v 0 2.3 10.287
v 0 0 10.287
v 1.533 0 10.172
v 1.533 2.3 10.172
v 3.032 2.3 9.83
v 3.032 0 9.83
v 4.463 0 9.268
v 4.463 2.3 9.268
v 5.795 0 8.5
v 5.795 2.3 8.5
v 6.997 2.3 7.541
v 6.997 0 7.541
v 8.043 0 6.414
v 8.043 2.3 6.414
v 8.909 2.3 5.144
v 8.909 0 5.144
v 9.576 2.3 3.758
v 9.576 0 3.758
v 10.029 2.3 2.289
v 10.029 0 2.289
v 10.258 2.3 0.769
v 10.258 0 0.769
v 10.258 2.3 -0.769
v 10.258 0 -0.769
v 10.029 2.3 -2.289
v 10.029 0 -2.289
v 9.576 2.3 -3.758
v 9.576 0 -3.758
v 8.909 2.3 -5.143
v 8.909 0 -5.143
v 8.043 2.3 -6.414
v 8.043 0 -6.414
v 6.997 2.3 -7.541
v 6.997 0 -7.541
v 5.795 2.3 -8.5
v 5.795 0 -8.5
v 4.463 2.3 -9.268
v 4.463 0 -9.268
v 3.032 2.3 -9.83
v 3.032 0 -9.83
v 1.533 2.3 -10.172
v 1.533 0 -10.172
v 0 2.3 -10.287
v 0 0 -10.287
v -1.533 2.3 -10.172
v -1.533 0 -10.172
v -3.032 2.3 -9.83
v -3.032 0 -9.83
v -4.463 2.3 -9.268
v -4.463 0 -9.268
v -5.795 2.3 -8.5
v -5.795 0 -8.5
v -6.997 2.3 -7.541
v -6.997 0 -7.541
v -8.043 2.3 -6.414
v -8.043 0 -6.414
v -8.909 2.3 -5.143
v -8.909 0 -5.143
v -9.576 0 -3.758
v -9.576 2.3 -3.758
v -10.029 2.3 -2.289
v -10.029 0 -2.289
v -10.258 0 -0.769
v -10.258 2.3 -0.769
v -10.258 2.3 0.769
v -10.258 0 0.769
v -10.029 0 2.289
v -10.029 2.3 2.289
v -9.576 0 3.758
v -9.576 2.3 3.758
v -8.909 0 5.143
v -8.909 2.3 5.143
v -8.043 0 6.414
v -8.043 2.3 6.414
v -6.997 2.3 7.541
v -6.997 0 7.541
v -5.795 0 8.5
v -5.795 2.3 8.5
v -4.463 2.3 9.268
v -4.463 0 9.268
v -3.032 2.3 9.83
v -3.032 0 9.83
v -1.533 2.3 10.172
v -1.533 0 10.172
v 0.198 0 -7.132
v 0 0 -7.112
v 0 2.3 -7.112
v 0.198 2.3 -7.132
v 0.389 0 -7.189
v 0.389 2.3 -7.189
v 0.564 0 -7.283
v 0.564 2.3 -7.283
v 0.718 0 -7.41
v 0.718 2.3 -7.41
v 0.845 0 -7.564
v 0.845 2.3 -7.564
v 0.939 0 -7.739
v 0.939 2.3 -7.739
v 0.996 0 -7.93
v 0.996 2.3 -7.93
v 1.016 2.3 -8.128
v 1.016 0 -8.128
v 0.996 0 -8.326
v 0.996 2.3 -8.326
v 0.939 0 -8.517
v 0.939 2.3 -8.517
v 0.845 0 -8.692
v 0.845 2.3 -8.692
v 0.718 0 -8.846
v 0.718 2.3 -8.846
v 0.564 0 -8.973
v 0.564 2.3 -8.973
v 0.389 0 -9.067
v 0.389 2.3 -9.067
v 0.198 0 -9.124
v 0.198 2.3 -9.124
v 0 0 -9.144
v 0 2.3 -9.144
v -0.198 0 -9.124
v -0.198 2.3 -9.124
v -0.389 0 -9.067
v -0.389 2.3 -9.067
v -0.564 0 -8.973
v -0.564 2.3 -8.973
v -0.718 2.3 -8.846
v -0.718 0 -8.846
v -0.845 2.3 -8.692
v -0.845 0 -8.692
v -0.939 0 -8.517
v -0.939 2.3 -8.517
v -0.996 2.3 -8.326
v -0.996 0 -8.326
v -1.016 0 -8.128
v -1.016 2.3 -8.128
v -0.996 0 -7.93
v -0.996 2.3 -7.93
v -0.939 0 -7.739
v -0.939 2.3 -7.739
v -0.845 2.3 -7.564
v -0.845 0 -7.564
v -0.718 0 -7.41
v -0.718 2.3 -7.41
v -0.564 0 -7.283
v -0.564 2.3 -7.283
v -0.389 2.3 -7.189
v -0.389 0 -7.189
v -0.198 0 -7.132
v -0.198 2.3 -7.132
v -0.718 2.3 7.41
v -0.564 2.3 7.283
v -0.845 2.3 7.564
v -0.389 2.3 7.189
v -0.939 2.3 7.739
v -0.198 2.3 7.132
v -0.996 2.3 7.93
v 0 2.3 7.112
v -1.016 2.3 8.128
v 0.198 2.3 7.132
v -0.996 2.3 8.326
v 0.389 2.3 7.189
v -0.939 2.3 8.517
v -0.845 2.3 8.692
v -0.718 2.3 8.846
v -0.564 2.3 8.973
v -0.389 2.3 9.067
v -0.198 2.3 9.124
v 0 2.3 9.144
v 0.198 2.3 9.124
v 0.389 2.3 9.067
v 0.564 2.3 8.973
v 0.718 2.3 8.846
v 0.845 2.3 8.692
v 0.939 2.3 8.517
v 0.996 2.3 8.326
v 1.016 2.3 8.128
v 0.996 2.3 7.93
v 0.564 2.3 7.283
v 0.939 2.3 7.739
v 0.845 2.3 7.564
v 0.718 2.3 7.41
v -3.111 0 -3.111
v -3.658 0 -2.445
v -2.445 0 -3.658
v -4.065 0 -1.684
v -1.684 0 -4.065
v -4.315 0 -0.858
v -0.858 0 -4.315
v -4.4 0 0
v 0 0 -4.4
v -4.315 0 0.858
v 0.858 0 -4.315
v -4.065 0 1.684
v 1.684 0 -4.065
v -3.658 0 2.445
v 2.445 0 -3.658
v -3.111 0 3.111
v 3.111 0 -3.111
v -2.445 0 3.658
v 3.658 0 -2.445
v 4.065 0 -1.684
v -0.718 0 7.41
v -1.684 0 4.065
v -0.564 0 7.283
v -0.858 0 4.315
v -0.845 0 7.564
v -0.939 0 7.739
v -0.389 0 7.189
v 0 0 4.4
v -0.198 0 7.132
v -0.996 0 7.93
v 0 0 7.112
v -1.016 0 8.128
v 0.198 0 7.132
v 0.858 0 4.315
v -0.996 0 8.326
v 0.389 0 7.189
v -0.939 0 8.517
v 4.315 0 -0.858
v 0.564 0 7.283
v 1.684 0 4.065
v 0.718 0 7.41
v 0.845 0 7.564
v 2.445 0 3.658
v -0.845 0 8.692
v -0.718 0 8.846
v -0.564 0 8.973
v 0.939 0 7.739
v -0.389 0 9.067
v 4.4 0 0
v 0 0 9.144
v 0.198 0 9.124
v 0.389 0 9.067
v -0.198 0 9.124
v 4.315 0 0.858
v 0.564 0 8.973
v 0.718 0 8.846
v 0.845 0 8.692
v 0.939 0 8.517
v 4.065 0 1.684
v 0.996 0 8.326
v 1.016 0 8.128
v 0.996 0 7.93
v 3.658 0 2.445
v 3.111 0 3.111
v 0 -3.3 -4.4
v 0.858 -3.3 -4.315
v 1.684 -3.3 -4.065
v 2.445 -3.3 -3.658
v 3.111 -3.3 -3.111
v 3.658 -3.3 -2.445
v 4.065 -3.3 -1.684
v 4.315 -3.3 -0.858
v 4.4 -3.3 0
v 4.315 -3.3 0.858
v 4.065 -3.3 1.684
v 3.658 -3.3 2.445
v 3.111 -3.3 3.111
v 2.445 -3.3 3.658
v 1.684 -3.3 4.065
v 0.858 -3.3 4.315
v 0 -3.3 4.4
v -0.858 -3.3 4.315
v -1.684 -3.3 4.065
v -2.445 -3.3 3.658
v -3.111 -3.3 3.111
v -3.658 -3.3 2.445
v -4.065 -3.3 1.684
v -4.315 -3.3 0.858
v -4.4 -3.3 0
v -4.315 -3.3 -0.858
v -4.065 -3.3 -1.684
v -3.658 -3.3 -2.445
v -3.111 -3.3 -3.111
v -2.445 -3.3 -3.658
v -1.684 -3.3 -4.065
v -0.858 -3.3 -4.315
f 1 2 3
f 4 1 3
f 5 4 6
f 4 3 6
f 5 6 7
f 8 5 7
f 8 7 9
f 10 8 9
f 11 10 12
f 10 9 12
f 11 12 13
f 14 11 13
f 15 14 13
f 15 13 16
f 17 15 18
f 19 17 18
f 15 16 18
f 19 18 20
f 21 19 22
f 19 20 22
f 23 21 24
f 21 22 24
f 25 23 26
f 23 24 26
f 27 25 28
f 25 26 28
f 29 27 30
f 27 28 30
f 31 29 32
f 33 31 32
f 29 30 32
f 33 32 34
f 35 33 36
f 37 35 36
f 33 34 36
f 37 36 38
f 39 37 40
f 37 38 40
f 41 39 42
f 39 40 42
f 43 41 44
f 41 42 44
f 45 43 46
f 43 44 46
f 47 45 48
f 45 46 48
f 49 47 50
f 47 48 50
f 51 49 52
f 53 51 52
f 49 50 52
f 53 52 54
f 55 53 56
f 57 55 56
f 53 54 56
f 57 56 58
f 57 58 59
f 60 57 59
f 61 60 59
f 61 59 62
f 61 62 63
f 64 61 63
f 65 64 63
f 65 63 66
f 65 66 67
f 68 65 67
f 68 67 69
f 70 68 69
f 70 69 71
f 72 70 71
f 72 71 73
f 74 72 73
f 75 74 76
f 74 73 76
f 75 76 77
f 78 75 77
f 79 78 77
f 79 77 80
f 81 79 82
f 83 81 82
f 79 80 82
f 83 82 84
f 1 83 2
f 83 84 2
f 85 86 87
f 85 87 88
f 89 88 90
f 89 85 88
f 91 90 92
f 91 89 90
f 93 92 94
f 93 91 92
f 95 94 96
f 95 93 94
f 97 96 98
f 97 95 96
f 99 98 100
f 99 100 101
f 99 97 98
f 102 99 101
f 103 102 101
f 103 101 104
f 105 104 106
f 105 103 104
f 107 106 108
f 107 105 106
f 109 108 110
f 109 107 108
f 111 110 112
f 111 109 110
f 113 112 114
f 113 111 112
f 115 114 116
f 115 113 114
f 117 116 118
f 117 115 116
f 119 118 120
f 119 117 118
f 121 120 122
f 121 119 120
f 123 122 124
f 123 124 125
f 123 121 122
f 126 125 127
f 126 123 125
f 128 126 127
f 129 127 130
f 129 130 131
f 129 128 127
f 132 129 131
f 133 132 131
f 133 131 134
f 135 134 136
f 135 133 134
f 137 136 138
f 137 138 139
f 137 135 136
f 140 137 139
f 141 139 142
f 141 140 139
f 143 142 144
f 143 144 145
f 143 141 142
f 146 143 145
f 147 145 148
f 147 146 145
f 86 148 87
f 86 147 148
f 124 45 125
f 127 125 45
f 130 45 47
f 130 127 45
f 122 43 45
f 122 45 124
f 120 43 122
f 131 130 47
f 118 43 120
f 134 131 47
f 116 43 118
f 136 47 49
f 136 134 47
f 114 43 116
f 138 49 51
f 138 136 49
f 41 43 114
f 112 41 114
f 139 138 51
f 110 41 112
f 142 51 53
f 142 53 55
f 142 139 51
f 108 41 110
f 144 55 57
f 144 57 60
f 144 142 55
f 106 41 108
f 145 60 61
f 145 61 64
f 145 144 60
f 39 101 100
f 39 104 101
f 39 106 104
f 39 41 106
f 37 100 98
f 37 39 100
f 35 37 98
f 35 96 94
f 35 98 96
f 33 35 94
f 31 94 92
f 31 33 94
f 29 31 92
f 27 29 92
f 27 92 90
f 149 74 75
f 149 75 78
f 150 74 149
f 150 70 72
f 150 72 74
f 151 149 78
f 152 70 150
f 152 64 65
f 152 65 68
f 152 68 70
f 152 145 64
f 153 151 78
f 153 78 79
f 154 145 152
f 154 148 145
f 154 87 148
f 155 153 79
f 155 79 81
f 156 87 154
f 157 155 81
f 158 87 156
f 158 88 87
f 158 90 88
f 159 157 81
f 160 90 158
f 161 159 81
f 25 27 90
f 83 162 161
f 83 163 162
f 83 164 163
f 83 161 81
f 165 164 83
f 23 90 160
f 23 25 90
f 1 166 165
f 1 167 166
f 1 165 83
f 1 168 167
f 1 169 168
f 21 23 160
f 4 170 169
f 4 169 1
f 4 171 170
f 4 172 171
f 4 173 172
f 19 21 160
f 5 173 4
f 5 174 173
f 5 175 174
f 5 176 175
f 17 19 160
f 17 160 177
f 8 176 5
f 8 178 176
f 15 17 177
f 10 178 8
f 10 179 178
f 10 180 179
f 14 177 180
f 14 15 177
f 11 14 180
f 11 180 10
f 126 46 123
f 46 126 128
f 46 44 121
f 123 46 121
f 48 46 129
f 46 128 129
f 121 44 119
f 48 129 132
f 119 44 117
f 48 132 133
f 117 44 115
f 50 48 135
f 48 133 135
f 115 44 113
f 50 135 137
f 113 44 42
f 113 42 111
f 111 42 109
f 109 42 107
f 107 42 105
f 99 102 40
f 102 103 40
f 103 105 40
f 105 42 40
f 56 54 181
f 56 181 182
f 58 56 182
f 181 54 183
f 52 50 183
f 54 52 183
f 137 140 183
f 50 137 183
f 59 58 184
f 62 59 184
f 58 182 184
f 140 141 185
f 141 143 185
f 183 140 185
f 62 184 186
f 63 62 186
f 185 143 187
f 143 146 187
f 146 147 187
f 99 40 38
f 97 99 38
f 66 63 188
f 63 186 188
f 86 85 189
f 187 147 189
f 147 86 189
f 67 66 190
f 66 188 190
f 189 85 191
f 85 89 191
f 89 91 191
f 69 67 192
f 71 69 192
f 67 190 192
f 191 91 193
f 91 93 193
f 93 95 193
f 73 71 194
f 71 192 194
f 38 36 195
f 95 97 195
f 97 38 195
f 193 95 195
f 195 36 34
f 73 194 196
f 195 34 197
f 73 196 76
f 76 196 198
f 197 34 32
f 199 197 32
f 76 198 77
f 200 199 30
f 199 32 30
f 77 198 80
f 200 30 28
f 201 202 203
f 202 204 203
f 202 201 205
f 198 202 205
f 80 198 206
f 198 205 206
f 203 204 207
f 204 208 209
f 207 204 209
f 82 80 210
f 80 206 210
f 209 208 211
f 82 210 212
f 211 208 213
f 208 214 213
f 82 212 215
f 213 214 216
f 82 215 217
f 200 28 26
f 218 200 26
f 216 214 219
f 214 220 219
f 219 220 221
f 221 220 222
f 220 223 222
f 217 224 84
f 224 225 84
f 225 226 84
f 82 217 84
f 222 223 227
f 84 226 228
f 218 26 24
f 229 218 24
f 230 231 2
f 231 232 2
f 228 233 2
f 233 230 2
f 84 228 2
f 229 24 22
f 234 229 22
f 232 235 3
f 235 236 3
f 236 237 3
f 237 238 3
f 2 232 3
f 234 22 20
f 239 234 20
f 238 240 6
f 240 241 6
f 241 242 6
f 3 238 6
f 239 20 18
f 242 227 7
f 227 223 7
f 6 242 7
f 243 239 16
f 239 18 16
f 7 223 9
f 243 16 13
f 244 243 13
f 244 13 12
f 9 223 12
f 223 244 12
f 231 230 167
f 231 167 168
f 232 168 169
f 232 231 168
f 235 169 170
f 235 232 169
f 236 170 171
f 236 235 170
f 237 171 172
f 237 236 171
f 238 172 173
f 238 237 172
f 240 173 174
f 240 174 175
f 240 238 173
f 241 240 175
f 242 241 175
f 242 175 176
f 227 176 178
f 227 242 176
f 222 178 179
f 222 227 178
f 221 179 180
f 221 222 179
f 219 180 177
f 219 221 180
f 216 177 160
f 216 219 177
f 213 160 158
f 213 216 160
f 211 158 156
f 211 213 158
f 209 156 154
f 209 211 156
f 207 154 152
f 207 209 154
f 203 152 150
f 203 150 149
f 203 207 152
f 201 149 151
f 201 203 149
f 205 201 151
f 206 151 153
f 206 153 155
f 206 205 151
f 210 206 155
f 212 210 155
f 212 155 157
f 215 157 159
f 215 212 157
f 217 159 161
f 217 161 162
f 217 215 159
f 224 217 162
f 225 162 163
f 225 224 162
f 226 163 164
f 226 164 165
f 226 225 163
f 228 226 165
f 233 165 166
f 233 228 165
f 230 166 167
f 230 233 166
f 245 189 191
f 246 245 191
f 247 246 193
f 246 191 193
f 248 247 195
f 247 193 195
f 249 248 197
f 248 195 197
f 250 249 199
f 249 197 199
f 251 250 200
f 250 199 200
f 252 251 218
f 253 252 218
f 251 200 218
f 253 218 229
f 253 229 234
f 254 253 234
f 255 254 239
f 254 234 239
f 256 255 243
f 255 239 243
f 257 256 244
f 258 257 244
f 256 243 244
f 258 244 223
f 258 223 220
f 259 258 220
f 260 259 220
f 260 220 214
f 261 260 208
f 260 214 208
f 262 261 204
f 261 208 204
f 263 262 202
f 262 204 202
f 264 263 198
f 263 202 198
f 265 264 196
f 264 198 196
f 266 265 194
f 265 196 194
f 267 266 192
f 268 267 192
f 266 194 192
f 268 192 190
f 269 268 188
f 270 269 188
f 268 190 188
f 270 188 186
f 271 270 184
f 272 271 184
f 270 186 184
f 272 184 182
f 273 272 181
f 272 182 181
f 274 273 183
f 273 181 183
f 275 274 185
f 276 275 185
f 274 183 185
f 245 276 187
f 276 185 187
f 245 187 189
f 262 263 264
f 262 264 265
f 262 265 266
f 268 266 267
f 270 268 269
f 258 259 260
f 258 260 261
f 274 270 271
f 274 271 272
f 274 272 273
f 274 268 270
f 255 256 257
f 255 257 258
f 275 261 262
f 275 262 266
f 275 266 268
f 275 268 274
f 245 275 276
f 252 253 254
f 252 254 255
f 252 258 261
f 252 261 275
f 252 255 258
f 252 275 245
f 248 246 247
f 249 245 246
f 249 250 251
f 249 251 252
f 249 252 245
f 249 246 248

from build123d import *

# Parameters (mm, degrees)
SKETCH1_R           = 10.287
BOSS_EXTRUDE1_DEPTH = 2.3
SKETCH2_R           = 4.4
BOSS_EXTRUDE2_DEPTH = 3.3
SKETCH4_R           = 1.016
CUT_EXTRUDE1_DEPTH  = 2.3


with BuildPart() as part:
    # Sketch1 → Boss-Extrude1 (new body)
    with BuildSketch(Plane(origin=(0, 0, 0), x_dir=(1, 0, 0), z_dir=(0, 1, 0))):
        with Locations(Location((0, 0, 0), (0, 0, 270))):
            Circle(SKETCH1_R)
    extrude(amount=BOSS_EXTRUDE1_DEPTH)

    # Sketch2 → Boss-Extrude2 (add)
    with BuildSketch(Plane(origin=(0, 0, 0), x_dir=(-1, 0, 0), z_dir=(0, -1, 0))):
        with Locations(Location((0, 0, 0), (0, 0, 90))):
            Circle(SKETCH2_R)
    extrude(amount=BOSS_EXTRUDE2_DEPTH)

    # Sketch4 → Cut-Extrude1 (cut)
    with BuildSketch(Plane(origin=(0, 0, 0), x_dir=(1, 0, 0), z_dir=(0, 1, 0))):
        with Locations(Location((0, 8.128, 0), (0, 0, 270))):
            Circle(SKETCH4_R)
        with Locations(Location((0, -8.128, 0), (0, 0, 270))):
            Circle(SKETCH4_R)
    extrude(amount=CUT_EXTRUDE1_DEPTH, mode=Mode.SUBTRACT)


solid = part.part
